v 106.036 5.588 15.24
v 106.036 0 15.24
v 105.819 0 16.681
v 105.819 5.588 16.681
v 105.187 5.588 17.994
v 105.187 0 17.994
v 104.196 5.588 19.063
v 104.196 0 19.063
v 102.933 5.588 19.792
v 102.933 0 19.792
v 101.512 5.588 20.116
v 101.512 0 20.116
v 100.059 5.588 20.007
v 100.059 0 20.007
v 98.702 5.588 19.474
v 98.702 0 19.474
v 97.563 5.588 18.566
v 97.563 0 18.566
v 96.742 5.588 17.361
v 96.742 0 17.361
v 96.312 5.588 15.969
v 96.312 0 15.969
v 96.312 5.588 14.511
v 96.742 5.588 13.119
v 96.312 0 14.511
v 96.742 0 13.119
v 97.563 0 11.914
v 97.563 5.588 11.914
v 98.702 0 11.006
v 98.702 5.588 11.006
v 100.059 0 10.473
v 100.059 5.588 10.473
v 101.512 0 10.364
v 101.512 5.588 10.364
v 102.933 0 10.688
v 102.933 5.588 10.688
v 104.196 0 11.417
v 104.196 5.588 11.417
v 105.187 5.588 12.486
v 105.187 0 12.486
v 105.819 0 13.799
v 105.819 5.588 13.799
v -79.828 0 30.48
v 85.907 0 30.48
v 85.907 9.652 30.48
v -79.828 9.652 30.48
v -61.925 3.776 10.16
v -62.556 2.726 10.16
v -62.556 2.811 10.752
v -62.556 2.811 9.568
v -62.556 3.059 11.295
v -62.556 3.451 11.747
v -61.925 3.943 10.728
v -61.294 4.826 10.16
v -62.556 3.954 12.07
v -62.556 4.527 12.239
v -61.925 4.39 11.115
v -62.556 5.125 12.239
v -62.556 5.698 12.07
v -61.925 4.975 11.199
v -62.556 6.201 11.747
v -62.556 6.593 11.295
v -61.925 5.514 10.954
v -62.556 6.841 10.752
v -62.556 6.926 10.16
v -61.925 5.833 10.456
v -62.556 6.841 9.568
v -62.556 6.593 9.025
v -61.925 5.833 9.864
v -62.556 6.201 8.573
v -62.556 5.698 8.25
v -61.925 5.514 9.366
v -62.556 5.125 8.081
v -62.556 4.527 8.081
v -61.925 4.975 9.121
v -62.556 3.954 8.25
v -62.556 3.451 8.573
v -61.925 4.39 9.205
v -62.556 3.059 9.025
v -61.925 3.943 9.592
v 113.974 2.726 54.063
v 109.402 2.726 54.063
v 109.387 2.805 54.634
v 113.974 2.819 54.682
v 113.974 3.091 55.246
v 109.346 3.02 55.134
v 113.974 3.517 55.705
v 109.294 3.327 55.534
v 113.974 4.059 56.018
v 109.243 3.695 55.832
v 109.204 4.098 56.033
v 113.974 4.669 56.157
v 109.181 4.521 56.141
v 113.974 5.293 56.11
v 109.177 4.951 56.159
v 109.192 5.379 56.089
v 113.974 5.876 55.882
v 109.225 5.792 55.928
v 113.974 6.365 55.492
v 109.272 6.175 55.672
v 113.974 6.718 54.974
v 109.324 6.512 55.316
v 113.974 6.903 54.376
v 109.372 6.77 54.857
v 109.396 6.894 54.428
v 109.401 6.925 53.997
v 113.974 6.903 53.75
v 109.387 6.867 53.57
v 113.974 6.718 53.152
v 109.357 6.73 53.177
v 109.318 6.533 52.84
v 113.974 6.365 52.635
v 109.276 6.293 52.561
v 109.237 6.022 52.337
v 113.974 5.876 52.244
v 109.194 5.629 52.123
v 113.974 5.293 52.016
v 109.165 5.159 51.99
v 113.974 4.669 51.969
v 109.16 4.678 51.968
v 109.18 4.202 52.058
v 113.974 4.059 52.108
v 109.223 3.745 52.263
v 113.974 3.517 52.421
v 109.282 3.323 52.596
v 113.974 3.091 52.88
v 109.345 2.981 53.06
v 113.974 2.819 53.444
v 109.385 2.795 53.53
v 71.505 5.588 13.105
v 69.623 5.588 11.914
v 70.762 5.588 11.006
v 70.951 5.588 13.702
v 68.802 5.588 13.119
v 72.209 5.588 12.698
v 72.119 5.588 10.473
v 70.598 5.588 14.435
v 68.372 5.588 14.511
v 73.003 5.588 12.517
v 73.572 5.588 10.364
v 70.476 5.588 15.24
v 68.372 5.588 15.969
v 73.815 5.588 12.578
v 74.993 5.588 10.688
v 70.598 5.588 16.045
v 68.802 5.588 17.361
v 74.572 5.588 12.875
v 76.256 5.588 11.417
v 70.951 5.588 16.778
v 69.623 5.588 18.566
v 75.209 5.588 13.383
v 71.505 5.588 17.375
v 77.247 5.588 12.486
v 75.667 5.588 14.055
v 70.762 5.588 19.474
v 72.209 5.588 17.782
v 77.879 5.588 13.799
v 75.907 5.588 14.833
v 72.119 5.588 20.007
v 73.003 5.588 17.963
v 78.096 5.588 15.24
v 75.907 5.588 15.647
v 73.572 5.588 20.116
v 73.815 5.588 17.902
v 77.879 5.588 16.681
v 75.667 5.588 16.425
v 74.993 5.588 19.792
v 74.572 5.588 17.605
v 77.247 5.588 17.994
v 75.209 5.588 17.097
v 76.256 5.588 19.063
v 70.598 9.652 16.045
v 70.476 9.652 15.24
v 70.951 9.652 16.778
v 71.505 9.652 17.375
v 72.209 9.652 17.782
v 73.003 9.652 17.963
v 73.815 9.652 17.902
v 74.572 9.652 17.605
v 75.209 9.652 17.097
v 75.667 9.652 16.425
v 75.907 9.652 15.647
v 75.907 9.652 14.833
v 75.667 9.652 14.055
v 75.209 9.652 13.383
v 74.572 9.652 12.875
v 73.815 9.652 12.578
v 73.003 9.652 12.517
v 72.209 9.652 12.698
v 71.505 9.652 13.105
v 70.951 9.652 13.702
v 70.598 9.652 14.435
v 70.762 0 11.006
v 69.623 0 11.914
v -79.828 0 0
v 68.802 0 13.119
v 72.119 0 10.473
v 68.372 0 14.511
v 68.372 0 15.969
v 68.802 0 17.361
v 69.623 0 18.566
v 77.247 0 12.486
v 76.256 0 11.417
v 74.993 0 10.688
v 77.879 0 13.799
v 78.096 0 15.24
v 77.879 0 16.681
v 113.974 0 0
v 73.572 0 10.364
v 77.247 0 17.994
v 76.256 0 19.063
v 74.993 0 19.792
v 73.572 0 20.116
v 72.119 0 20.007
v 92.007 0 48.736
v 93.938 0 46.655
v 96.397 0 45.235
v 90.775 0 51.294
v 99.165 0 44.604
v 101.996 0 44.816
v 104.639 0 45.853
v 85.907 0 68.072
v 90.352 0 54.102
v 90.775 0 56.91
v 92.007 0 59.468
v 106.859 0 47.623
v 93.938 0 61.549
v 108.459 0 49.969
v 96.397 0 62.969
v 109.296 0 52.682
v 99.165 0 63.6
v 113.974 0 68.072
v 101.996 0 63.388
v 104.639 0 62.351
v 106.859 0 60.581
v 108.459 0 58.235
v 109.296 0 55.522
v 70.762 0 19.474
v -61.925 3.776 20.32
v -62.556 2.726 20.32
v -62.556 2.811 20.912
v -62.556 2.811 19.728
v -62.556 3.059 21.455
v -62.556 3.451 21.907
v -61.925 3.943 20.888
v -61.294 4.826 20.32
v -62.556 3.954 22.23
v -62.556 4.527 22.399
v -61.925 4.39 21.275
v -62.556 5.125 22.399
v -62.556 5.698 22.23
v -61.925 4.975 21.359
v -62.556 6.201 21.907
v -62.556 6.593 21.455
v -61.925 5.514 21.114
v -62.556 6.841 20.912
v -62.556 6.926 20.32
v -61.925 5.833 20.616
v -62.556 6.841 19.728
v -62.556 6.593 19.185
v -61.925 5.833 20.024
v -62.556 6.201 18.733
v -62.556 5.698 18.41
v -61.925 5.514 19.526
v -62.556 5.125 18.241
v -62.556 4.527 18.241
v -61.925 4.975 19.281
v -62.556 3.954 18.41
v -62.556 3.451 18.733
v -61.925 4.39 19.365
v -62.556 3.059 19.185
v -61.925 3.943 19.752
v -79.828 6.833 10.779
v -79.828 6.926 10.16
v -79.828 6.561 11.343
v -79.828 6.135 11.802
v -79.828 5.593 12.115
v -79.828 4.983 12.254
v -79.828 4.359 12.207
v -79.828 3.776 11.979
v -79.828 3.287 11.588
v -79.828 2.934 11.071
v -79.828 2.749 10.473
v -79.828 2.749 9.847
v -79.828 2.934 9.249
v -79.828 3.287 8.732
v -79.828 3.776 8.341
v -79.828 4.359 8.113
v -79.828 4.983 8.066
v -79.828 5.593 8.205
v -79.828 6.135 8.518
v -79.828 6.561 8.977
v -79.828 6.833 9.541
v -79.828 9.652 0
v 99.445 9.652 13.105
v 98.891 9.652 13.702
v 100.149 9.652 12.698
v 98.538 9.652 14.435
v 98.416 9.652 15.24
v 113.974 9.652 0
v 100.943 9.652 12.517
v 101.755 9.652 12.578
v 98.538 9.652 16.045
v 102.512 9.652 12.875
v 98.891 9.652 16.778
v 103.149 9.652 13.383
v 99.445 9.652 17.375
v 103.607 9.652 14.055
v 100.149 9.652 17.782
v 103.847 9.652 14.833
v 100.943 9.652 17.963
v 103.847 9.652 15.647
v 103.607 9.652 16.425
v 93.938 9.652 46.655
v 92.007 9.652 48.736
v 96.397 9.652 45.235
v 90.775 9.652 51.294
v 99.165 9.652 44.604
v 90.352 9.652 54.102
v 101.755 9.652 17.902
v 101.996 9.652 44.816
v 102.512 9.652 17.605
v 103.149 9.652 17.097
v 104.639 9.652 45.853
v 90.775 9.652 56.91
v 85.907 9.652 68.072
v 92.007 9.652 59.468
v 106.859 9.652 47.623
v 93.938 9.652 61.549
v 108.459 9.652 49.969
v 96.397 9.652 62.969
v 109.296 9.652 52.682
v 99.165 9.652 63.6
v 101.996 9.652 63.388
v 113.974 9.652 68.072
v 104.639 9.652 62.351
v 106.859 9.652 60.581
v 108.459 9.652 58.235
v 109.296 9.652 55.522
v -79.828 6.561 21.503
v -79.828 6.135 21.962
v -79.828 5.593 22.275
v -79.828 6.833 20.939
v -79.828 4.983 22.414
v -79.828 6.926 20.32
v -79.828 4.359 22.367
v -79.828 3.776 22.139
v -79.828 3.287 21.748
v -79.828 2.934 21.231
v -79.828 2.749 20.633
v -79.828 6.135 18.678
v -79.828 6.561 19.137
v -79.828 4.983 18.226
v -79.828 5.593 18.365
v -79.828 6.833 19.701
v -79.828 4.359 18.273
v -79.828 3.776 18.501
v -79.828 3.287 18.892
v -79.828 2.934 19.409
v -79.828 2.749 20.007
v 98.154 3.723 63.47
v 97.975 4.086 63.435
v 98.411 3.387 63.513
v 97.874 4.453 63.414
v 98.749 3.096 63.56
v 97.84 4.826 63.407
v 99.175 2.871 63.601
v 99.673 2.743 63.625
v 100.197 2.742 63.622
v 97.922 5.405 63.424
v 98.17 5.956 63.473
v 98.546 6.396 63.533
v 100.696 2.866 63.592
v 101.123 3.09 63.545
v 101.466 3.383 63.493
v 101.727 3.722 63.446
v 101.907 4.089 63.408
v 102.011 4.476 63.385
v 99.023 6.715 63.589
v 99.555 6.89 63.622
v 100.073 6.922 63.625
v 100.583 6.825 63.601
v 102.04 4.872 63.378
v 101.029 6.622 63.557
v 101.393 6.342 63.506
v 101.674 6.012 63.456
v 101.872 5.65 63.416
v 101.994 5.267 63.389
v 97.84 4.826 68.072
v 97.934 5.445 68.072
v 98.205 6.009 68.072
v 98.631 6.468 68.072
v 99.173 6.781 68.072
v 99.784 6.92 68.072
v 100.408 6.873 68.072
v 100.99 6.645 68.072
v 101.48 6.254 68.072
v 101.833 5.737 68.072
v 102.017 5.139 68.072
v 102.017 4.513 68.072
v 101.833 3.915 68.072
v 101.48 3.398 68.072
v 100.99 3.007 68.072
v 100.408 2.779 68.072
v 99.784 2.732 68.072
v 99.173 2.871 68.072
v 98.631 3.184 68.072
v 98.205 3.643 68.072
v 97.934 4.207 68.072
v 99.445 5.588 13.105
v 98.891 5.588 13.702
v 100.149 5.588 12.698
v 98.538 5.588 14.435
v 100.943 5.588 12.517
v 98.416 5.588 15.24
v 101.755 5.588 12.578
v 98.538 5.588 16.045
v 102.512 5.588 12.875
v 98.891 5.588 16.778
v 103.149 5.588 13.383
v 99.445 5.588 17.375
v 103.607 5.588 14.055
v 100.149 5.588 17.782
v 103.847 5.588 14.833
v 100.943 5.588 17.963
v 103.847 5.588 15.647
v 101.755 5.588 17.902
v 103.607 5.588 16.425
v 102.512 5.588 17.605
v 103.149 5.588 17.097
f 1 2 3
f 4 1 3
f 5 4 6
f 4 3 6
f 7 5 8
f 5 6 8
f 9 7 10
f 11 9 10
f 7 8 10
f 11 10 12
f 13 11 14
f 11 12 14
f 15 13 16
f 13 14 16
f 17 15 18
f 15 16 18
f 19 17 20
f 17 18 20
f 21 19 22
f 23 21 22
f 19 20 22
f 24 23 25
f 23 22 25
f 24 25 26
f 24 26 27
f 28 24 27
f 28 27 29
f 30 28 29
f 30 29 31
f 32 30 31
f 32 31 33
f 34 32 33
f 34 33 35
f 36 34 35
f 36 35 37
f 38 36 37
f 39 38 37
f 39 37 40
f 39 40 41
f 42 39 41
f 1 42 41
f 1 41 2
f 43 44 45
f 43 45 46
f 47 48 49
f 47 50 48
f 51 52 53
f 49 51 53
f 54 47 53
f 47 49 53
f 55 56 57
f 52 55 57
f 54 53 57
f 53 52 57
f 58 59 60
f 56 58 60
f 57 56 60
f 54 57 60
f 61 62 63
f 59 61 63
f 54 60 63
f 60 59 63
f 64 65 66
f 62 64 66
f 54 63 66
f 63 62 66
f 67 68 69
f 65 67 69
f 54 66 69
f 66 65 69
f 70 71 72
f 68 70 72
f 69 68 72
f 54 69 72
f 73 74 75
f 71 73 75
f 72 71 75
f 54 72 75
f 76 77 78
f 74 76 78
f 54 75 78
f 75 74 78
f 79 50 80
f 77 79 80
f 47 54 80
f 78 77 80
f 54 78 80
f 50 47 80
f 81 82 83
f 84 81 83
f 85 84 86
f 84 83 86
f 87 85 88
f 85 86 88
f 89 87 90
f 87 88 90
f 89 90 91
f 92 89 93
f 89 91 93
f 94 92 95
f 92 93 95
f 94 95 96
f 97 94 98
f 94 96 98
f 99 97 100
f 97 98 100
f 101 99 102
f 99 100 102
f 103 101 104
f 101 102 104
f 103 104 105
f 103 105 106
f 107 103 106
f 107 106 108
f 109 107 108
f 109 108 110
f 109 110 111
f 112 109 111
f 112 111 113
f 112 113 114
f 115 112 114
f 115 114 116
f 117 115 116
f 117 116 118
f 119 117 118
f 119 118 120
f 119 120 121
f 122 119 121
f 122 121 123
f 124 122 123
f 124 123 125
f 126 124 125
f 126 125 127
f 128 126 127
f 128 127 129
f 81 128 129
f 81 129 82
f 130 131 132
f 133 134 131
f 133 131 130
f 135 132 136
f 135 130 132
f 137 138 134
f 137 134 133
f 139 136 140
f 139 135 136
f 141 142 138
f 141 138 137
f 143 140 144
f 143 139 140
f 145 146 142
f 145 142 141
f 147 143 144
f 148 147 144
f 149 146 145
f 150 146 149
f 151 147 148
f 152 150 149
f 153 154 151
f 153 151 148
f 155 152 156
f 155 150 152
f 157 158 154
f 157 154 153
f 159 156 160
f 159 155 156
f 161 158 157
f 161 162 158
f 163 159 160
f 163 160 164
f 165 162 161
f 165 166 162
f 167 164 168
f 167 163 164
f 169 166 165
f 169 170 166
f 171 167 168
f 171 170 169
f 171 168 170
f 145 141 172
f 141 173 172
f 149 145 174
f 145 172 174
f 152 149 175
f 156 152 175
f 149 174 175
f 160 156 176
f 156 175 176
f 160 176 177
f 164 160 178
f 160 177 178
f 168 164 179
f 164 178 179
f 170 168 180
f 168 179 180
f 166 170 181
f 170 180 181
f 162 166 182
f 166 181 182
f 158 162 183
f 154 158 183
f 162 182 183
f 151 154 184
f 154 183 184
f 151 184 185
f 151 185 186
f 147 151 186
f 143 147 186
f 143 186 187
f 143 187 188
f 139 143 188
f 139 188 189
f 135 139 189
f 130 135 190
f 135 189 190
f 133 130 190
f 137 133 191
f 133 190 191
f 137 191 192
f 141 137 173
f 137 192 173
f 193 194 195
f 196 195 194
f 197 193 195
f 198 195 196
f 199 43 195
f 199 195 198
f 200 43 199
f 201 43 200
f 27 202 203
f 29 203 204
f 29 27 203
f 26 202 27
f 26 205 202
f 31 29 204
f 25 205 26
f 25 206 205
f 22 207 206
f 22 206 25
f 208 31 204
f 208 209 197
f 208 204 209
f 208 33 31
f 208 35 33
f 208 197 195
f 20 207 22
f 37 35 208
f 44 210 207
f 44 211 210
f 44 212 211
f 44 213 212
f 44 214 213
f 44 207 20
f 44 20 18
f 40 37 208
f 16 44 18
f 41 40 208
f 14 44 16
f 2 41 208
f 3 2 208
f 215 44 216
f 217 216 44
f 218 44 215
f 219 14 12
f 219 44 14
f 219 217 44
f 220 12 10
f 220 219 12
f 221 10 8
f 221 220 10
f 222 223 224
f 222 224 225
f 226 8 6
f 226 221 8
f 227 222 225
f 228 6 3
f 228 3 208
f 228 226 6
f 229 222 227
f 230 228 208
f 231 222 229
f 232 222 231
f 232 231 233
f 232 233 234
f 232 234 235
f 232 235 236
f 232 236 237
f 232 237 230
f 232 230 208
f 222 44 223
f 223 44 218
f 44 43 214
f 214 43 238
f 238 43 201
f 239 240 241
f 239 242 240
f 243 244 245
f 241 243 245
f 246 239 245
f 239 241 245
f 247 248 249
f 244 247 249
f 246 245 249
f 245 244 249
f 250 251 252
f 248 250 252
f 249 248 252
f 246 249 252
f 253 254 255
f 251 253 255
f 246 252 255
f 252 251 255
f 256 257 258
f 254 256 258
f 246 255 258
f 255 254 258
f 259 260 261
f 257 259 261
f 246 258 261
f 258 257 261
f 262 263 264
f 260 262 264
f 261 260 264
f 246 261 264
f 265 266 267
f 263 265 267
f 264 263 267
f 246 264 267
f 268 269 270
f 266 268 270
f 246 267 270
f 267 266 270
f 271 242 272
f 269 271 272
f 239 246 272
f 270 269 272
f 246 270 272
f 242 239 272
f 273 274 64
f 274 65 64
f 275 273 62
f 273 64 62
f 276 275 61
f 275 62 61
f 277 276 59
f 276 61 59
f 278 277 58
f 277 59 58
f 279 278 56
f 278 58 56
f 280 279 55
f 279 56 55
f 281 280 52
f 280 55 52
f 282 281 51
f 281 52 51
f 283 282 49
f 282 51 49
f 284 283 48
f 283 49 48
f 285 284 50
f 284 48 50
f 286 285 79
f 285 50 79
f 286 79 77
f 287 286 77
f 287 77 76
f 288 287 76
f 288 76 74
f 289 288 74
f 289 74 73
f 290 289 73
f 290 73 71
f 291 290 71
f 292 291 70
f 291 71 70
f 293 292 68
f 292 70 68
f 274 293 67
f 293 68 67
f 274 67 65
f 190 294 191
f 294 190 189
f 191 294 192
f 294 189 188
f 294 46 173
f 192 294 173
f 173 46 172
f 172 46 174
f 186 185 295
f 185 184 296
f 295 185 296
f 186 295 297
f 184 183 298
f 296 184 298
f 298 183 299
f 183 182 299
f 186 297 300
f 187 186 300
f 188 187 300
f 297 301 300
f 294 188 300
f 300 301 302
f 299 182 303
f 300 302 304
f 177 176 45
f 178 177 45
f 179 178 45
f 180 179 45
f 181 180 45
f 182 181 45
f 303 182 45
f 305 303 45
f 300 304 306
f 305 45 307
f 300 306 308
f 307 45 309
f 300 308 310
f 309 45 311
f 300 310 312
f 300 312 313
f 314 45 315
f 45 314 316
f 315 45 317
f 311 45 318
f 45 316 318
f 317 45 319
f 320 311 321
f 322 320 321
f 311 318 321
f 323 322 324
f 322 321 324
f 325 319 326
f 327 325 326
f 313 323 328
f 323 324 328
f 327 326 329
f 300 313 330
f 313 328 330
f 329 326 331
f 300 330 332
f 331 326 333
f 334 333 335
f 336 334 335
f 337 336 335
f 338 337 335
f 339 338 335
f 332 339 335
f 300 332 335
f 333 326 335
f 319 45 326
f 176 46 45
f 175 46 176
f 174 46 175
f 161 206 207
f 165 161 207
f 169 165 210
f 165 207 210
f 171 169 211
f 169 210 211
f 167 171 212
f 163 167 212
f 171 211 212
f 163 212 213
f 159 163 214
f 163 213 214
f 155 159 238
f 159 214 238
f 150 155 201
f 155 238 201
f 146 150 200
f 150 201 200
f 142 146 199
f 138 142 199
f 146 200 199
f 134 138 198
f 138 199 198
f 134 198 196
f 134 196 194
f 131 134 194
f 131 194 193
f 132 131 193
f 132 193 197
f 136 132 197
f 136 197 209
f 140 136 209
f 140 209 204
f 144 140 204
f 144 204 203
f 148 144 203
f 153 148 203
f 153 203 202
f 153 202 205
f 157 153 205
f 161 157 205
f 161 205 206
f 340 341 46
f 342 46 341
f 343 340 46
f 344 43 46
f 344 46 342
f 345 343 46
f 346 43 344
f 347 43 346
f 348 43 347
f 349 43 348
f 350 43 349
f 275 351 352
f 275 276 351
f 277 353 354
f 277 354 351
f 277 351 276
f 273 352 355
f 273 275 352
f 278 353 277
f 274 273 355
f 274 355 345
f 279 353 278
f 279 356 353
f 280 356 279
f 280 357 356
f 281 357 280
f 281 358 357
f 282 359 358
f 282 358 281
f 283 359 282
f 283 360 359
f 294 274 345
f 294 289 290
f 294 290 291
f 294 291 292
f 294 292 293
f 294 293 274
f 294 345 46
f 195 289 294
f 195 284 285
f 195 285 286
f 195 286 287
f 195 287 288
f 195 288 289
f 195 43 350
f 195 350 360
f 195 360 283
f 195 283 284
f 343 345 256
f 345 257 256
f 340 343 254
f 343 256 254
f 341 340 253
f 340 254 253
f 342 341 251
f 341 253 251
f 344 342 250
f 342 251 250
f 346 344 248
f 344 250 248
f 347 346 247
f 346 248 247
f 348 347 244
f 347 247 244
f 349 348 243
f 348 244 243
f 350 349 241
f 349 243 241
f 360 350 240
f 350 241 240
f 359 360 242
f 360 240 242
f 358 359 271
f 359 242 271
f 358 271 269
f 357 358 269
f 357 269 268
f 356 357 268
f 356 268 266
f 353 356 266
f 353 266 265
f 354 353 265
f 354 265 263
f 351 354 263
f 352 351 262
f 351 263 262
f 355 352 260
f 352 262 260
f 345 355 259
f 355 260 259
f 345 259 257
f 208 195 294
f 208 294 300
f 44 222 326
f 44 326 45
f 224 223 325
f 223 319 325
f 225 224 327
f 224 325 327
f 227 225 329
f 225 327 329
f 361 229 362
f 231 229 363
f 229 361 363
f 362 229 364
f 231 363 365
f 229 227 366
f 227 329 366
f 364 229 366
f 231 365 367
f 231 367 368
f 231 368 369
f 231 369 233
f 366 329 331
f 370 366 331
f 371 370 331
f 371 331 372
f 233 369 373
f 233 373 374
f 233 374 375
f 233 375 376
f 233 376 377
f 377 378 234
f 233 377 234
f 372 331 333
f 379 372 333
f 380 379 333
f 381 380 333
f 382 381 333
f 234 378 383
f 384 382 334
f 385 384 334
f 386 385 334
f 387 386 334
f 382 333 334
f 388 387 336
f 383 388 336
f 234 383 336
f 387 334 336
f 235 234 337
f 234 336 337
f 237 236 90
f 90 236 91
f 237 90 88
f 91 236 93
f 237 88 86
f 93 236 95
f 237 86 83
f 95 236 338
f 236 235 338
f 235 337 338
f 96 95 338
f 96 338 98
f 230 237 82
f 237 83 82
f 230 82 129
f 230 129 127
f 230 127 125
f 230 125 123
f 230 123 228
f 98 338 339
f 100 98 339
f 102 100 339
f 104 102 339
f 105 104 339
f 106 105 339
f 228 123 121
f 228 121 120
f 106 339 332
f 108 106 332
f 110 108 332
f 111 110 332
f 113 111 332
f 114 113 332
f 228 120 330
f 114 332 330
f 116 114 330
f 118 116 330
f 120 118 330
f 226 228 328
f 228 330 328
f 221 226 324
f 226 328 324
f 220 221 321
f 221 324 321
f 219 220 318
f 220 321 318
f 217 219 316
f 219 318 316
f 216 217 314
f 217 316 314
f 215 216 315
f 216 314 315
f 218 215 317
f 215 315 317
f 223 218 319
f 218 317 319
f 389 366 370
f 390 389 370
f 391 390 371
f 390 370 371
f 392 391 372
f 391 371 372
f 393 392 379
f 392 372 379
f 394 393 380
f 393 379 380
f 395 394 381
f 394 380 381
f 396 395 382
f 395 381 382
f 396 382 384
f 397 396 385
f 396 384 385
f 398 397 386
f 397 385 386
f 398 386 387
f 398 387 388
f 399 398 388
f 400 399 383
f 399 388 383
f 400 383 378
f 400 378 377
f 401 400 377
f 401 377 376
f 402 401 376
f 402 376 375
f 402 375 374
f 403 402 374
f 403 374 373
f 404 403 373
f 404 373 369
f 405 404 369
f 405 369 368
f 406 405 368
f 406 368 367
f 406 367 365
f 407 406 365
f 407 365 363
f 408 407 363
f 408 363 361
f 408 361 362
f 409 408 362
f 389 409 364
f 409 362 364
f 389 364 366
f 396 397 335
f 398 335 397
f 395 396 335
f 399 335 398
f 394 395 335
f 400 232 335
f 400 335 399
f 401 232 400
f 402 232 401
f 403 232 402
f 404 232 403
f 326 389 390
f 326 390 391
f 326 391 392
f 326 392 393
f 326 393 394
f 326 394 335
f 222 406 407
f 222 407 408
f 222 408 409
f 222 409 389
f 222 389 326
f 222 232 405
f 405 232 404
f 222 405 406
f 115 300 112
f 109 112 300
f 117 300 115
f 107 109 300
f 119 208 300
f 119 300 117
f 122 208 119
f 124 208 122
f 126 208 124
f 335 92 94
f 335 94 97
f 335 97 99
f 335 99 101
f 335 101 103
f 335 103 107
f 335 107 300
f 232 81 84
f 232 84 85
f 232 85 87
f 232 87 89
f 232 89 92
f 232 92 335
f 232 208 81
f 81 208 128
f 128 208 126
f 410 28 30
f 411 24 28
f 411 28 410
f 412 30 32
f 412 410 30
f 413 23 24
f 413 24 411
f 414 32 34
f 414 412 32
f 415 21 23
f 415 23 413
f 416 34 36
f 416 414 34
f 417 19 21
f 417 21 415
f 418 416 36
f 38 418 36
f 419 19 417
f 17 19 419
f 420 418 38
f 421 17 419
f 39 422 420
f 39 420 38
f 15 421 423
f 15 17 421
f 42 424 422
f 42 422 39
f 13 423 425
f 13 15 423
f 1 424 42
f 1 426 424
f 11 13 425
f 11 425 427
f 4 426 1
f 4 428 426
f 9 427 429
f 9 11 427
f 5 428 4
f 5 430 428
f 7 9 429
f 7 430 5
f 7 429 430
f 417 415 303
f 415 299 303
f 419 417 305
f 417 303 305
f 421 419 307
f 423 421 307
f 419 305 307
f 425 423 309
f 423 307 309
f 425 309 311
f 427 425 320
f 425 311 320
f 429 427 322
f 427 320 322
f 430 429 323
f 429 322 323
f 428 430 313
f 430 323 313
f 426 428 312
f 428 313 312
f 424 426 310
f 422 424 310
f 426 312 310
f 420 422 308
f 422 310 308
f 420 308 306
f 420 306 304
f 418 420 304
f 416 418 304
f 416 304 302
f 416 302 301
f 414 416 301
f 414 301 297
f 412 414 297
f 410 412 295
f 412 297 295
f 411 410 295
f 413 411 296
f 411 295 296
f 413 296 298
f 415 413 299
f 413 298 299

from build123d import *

# Parameters (mm, degrees)
F1_DEPTH       = 9.652
F3_D           = 5.461
F3_CBORE_D     = 9.779
F3_CBORE_DEPTH = 5.588
F5_D           = 19.05
F7_D           = 4.2
F7_DEPTH       = 12.7
F7_TIP         = 1.2618073
F9_D           = 4.2
F9_DEPTH       = 12.7
F9_TIP         = 1.2618073
F11_D          = 4.2
F11_DEPTH      = 17.272
F11_TIP        = 1.2618073


with BuildPart() as f1:
    # F0 (on Front) → F1 (new body)
    with BuildSketch(Plane.XZ):
        Polygon((-79.8280344415, 30.48), (-79.8280344415, 0), (113.9739655585, 0), (113.9739655585, 68.072), (85.9069655585, 68.072), (85.9069655585, 30.48), align=None)
    extrude(amount=-F1_DEPTH)

    # F3 (through all)
    with Locations(Plane.XZ):
        with Locations((73.2069655585, 15.24), (101.1469655585, 15.24)):
            CounterBoreHole(F3_D / 2, F3_CBORE_D / 2, F3_CBORE_DEPTH)

    # F5 (through all)
    with Locations(Plane.XZ):
        with Locations((99.8769655585, 54.102)):
            Hole(F5_D / 2)

    # F7
    with Locations(Plane.XY.offset(68.072)):
        with Locations((99.9404655585, 4.826)):
            Hole(F7_D / 2, depth=F7_DEPTH)
            with Locations((0, 0, -(F7_DEPTH + F7_TIP / 2))):  # 118° drill point
                Cone(0, F7_D / 2, F7_TIP, mode=Mode.SUBTRACT)

    # F9
    with Locations(Plane.YZ.offset(113.9739655585)):
        with Locations((4.826, 54.063147307)):
            Hole(F9_D / 2, depth=F9_DEPTH)
            with Locations((0, 0, -(F9_DEPTH + F9_TIP / 2))):  # 118° drill point
                Cone(0, F9_D / 2, F9_TIP, mode=Mode.SUBTRACT)

    # F11
    with Locations(Plane(origin=(-79.8280344415, 0, 0), x_dir=(0, -1, 0), z_dir=(-1, 0, 0))):
        with Locations((-4.826, 20.32), (-4.826, 10.16)):
            Hole(F11_D / 2, depth=F11_DEPTH)
            with Locations((0, 0, -(F11_DEPTH + F11_TIP / 2))):  # 118° drill point
                Cone(0, F11_D / 2, F11_TIP, mode=Mode.SUBTRACT)


with BuildPart() as f12_1:
    # F12: copy of F1
    add(f1.part)


solid = f1.part
